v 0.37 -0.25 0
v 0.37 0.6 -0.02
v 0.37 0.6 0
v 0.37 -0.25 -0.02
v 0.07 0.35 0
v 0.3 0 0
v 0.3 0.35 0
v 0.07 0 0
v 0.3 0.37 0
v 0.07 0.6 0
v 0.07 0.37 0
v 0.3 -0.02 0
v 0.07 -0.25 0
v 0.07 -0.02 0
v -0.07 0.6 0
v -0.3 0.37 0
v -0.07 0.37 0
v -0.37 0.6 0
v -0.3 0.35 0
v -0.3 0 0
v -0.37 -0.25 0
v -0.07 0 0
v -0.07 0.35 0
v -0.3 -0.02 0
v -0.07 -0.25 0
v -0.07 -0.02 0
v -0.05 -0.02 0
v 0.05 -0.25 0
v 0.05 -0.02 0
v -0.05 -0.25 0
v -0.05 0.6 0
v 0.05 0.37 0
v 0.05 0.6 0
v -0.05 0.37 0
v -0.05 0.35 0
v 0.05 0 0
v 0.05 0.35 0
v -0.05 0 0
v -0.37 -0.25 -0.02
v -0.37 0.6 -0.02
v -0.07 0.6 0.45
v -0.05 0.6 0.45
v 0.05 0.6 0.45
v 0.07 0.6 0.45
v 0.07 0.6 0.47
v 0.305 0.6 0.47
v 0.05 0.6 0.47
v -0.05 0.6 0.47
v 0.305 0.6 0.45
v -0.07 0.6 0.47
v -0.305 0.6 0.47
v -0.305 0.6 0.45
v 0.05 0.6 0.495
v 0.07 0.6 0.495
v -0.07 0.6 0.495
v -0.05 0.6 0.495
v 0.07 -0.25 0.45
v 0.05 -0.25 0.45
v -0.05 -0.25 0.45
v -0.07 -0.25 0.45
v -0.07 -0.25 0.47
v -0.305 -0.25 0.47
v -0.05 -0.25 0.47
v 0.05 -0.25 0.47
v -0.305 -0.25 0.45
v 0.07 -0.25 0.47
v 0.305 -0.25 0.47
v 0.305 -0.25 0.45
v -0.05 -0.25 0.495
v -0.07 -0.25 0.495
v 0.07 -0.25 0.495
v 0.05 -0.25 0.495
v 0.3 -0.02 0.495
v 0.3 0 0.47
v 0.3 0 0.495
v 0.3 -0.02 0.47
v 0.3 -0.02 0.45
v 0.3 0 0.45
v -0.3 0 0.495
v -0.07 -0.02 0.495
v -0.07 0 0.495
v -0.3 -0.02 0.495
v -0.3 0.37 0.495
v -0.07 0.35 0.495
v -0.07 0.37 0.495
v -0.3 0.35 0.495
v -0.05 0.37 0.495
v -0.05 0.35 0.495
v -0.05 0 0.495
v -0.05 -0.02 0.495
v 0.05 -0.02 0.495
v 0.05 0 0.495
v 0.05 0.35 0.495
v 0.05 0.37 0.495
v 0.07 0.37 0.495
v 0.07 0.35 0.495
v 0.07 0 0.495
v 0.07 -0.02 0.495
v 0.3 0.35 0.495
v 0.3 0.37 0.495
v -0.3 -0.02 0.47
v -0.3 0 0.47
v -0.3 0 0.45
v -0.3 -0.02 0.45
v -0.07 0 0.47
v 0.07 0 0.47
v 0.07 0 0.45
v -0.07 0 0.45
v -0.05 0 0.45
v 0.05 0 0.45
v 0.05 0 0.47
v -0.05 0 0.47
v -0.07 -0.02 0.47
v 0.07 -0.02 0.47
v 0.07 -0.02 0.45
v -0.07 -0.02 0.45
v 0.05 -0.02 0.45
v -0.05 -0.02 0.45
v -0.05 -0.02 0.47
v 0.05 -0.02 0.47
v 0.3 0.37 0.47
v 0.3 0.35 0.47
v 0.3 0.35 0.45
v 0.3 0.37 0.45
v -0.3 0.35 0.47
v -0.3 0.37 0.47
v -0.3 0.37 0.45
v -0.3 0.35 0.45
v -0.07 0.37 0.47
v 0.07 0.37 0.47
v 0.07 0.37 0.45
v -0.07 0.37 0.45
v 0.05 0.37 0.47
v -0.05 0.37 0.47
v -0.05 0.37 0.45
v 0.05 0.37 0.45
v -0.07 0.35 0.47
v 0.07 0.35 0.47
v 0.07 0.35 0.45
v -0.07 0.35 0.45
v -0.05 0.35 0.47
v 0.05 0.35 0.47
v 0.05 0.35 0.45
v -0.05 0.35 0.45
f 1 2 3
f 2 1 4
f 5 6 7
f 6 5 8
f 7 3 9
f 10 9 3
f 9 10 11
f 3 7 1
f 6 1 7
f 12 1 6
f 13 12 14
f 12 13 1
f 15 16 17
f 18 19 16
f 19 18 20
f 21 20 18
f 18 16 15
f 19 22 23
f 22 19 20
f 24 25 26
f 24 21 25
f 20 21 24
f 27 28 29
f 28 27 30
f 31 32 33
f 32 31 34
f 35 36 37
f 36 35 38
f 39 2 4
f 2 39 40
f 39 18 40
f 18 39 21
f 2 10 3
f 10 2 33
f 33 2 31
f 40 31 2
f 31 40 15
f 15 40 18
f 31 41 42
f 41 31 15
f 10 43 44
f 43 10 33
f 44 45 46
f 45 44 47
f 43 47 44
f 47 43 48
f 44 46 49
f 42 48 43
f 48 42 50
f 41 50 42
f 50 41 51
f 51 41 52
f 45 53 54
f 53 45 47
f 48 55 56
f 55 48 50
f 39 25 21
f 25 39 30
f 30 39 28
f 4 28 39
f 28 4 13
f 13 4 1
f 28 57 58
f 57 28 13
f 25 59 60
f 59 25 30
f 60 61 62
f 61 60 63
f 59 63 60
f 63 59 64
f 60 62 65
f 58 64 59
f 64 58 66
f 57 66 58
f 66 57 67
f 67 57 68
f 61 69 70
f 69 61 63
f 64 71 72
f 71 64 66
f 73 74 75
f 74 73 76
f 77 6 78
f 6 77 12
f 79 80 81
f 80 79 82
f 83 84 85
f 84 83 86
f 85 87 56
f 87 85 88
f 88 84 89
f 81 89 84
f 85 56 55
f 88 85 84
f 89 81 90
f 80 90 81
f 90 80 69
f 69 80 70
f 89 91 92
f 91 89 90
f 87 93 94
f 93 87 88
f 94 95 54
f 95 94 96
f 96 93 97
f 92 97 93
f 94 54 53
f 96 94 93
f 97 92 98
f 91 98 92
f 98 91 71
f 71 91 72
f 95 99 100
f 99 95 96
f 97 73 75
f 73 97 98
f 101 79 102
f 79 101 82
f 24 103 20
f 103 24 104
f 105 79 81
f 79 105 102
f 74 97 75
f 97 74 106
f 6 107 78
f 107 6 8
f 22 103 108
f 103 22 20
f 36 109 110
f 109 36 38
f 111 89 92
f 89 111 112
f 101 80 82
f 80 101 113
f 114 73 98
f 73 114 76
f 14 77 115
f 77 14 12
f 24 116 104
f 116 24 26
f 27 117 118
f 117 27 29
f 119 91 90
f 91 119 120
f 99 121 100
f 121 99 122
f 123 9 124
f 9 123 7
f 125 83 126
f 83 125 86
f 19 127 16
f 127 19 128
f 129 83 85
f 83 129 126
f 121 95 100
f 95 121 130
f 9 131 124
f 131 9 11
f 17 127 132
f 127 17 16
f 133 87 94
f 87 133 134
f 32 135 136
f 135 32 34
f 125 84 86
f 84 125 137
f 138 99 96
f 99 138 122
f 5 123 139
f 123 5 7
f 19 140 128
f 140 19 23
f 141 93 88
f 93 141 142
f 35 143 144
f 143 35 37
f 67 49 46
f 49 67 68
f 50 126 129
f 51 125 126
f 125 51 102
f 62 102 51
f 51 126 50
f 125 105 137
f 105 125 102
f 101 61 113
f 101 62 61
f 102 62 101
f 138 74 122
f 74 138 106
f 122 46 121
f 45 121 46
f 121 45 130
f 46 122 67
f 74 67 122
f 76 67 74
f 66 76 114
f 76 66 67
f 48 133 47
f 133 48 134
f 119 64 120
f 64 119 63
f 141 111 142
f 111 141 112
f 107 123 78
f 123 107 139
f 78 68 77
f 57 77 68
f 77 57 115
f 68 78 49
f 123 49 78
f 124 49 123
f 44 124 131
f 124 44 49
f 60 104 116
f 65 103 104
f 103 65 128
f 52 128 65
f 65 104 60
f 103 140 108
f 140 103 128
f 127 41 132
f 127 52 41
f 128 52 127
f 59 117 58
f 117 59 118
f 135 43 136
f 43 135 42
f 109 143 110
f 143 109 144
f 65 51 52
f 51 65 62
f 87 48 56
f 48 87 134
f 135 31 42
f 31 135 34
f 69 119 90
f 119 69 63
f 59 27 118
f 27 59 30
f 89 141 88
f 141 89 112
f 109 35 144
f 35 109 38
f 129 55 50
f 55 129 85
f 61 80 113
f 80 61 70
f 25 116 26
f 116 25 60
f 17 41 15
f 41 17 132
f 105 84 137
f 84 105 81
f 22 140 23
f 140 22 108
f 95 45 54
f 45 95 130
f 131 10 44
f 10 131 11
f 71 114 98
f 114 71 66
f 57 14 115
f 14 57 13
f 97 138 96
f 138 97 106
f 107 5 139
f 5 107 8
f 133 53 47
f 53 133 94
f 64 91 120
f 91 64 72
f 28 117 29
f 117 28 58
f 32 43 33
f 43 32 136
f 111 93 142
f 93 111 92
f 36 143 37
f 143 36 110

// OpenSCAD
//Starting variables in the general case
mode = 0;

//Geometric data
//Dimension : principal box
w=0.10;       //'void' widith;  x
l=0.35;       //box length;  y
h=0.45;       //box height;  z
e=0.02;     //thickness walls
 
//MAKE IT BIG
big=0.5;
//Floor
module bot() {
    translate([0,0.5*l,-e/2]) 
        cube([2*w+2*e+big,l+big,e],true);
}
//Pression lateral mov y+-
module pisty1() {
    translate([-w/2-big/2,-e ,0]) 
        color("red") 
        cube([w+big,e,h*1.1]);
}
module pisty2() {
    translate([-w/2-big/2,l,0]) 
        color("red") 
        cube([w+big,e, h*1.1]);
}
//Pression lateral mov x+-
module pistx1() {
    translate([-w/2-e,-big/2,0]) 
        color("red") 
        cube([e,l+big,h*1.1]);
}
module pistx2() {
    translate([w/2,-big/2,0]) 
        color("red") 
        cube([e,l+big,h*1.1]);
}
//Pression vertical mov z-
module pistz() {
    translate([0,l/2 ,h+e/2]) 
        color("red") 
        cube([w*1.1+big,l+big, e], true); 
}
//InsHelper
 module insertHelper() {
    difference() {
        translate([0,l/2 ,h*1.6+e]) 
            color("blue") 
            cube([w*1.2,l*1.2, h+2*e], true);
        translate([0,l/2 ,h*1.6]) 
            color("orange") 
            cube([w,l,h+2*e], true);
    }
}
//Draw All
module all(){
    bot();
    pisty1();
    pisty2();
    pistz();
    pistx1();
    pistx2();
    //insertHelper(); 
}
//Execution
if (mode==1){
    bot();
}else if (mode==21){
    pisty1();
}else if (mode==22){
    pisty2();
}else if (mode==31){
    pistx1();
}else if (mode==32){
    pistx2();
}else if (mode==4) {
    pistz();
}else if (mode==5) {
    insertHelper(); 
}else{
    all();
}
//insertion region - - visualisation only - -
//translate([-0.45,2,24]) color("white") cube([0.9,31,20]);
